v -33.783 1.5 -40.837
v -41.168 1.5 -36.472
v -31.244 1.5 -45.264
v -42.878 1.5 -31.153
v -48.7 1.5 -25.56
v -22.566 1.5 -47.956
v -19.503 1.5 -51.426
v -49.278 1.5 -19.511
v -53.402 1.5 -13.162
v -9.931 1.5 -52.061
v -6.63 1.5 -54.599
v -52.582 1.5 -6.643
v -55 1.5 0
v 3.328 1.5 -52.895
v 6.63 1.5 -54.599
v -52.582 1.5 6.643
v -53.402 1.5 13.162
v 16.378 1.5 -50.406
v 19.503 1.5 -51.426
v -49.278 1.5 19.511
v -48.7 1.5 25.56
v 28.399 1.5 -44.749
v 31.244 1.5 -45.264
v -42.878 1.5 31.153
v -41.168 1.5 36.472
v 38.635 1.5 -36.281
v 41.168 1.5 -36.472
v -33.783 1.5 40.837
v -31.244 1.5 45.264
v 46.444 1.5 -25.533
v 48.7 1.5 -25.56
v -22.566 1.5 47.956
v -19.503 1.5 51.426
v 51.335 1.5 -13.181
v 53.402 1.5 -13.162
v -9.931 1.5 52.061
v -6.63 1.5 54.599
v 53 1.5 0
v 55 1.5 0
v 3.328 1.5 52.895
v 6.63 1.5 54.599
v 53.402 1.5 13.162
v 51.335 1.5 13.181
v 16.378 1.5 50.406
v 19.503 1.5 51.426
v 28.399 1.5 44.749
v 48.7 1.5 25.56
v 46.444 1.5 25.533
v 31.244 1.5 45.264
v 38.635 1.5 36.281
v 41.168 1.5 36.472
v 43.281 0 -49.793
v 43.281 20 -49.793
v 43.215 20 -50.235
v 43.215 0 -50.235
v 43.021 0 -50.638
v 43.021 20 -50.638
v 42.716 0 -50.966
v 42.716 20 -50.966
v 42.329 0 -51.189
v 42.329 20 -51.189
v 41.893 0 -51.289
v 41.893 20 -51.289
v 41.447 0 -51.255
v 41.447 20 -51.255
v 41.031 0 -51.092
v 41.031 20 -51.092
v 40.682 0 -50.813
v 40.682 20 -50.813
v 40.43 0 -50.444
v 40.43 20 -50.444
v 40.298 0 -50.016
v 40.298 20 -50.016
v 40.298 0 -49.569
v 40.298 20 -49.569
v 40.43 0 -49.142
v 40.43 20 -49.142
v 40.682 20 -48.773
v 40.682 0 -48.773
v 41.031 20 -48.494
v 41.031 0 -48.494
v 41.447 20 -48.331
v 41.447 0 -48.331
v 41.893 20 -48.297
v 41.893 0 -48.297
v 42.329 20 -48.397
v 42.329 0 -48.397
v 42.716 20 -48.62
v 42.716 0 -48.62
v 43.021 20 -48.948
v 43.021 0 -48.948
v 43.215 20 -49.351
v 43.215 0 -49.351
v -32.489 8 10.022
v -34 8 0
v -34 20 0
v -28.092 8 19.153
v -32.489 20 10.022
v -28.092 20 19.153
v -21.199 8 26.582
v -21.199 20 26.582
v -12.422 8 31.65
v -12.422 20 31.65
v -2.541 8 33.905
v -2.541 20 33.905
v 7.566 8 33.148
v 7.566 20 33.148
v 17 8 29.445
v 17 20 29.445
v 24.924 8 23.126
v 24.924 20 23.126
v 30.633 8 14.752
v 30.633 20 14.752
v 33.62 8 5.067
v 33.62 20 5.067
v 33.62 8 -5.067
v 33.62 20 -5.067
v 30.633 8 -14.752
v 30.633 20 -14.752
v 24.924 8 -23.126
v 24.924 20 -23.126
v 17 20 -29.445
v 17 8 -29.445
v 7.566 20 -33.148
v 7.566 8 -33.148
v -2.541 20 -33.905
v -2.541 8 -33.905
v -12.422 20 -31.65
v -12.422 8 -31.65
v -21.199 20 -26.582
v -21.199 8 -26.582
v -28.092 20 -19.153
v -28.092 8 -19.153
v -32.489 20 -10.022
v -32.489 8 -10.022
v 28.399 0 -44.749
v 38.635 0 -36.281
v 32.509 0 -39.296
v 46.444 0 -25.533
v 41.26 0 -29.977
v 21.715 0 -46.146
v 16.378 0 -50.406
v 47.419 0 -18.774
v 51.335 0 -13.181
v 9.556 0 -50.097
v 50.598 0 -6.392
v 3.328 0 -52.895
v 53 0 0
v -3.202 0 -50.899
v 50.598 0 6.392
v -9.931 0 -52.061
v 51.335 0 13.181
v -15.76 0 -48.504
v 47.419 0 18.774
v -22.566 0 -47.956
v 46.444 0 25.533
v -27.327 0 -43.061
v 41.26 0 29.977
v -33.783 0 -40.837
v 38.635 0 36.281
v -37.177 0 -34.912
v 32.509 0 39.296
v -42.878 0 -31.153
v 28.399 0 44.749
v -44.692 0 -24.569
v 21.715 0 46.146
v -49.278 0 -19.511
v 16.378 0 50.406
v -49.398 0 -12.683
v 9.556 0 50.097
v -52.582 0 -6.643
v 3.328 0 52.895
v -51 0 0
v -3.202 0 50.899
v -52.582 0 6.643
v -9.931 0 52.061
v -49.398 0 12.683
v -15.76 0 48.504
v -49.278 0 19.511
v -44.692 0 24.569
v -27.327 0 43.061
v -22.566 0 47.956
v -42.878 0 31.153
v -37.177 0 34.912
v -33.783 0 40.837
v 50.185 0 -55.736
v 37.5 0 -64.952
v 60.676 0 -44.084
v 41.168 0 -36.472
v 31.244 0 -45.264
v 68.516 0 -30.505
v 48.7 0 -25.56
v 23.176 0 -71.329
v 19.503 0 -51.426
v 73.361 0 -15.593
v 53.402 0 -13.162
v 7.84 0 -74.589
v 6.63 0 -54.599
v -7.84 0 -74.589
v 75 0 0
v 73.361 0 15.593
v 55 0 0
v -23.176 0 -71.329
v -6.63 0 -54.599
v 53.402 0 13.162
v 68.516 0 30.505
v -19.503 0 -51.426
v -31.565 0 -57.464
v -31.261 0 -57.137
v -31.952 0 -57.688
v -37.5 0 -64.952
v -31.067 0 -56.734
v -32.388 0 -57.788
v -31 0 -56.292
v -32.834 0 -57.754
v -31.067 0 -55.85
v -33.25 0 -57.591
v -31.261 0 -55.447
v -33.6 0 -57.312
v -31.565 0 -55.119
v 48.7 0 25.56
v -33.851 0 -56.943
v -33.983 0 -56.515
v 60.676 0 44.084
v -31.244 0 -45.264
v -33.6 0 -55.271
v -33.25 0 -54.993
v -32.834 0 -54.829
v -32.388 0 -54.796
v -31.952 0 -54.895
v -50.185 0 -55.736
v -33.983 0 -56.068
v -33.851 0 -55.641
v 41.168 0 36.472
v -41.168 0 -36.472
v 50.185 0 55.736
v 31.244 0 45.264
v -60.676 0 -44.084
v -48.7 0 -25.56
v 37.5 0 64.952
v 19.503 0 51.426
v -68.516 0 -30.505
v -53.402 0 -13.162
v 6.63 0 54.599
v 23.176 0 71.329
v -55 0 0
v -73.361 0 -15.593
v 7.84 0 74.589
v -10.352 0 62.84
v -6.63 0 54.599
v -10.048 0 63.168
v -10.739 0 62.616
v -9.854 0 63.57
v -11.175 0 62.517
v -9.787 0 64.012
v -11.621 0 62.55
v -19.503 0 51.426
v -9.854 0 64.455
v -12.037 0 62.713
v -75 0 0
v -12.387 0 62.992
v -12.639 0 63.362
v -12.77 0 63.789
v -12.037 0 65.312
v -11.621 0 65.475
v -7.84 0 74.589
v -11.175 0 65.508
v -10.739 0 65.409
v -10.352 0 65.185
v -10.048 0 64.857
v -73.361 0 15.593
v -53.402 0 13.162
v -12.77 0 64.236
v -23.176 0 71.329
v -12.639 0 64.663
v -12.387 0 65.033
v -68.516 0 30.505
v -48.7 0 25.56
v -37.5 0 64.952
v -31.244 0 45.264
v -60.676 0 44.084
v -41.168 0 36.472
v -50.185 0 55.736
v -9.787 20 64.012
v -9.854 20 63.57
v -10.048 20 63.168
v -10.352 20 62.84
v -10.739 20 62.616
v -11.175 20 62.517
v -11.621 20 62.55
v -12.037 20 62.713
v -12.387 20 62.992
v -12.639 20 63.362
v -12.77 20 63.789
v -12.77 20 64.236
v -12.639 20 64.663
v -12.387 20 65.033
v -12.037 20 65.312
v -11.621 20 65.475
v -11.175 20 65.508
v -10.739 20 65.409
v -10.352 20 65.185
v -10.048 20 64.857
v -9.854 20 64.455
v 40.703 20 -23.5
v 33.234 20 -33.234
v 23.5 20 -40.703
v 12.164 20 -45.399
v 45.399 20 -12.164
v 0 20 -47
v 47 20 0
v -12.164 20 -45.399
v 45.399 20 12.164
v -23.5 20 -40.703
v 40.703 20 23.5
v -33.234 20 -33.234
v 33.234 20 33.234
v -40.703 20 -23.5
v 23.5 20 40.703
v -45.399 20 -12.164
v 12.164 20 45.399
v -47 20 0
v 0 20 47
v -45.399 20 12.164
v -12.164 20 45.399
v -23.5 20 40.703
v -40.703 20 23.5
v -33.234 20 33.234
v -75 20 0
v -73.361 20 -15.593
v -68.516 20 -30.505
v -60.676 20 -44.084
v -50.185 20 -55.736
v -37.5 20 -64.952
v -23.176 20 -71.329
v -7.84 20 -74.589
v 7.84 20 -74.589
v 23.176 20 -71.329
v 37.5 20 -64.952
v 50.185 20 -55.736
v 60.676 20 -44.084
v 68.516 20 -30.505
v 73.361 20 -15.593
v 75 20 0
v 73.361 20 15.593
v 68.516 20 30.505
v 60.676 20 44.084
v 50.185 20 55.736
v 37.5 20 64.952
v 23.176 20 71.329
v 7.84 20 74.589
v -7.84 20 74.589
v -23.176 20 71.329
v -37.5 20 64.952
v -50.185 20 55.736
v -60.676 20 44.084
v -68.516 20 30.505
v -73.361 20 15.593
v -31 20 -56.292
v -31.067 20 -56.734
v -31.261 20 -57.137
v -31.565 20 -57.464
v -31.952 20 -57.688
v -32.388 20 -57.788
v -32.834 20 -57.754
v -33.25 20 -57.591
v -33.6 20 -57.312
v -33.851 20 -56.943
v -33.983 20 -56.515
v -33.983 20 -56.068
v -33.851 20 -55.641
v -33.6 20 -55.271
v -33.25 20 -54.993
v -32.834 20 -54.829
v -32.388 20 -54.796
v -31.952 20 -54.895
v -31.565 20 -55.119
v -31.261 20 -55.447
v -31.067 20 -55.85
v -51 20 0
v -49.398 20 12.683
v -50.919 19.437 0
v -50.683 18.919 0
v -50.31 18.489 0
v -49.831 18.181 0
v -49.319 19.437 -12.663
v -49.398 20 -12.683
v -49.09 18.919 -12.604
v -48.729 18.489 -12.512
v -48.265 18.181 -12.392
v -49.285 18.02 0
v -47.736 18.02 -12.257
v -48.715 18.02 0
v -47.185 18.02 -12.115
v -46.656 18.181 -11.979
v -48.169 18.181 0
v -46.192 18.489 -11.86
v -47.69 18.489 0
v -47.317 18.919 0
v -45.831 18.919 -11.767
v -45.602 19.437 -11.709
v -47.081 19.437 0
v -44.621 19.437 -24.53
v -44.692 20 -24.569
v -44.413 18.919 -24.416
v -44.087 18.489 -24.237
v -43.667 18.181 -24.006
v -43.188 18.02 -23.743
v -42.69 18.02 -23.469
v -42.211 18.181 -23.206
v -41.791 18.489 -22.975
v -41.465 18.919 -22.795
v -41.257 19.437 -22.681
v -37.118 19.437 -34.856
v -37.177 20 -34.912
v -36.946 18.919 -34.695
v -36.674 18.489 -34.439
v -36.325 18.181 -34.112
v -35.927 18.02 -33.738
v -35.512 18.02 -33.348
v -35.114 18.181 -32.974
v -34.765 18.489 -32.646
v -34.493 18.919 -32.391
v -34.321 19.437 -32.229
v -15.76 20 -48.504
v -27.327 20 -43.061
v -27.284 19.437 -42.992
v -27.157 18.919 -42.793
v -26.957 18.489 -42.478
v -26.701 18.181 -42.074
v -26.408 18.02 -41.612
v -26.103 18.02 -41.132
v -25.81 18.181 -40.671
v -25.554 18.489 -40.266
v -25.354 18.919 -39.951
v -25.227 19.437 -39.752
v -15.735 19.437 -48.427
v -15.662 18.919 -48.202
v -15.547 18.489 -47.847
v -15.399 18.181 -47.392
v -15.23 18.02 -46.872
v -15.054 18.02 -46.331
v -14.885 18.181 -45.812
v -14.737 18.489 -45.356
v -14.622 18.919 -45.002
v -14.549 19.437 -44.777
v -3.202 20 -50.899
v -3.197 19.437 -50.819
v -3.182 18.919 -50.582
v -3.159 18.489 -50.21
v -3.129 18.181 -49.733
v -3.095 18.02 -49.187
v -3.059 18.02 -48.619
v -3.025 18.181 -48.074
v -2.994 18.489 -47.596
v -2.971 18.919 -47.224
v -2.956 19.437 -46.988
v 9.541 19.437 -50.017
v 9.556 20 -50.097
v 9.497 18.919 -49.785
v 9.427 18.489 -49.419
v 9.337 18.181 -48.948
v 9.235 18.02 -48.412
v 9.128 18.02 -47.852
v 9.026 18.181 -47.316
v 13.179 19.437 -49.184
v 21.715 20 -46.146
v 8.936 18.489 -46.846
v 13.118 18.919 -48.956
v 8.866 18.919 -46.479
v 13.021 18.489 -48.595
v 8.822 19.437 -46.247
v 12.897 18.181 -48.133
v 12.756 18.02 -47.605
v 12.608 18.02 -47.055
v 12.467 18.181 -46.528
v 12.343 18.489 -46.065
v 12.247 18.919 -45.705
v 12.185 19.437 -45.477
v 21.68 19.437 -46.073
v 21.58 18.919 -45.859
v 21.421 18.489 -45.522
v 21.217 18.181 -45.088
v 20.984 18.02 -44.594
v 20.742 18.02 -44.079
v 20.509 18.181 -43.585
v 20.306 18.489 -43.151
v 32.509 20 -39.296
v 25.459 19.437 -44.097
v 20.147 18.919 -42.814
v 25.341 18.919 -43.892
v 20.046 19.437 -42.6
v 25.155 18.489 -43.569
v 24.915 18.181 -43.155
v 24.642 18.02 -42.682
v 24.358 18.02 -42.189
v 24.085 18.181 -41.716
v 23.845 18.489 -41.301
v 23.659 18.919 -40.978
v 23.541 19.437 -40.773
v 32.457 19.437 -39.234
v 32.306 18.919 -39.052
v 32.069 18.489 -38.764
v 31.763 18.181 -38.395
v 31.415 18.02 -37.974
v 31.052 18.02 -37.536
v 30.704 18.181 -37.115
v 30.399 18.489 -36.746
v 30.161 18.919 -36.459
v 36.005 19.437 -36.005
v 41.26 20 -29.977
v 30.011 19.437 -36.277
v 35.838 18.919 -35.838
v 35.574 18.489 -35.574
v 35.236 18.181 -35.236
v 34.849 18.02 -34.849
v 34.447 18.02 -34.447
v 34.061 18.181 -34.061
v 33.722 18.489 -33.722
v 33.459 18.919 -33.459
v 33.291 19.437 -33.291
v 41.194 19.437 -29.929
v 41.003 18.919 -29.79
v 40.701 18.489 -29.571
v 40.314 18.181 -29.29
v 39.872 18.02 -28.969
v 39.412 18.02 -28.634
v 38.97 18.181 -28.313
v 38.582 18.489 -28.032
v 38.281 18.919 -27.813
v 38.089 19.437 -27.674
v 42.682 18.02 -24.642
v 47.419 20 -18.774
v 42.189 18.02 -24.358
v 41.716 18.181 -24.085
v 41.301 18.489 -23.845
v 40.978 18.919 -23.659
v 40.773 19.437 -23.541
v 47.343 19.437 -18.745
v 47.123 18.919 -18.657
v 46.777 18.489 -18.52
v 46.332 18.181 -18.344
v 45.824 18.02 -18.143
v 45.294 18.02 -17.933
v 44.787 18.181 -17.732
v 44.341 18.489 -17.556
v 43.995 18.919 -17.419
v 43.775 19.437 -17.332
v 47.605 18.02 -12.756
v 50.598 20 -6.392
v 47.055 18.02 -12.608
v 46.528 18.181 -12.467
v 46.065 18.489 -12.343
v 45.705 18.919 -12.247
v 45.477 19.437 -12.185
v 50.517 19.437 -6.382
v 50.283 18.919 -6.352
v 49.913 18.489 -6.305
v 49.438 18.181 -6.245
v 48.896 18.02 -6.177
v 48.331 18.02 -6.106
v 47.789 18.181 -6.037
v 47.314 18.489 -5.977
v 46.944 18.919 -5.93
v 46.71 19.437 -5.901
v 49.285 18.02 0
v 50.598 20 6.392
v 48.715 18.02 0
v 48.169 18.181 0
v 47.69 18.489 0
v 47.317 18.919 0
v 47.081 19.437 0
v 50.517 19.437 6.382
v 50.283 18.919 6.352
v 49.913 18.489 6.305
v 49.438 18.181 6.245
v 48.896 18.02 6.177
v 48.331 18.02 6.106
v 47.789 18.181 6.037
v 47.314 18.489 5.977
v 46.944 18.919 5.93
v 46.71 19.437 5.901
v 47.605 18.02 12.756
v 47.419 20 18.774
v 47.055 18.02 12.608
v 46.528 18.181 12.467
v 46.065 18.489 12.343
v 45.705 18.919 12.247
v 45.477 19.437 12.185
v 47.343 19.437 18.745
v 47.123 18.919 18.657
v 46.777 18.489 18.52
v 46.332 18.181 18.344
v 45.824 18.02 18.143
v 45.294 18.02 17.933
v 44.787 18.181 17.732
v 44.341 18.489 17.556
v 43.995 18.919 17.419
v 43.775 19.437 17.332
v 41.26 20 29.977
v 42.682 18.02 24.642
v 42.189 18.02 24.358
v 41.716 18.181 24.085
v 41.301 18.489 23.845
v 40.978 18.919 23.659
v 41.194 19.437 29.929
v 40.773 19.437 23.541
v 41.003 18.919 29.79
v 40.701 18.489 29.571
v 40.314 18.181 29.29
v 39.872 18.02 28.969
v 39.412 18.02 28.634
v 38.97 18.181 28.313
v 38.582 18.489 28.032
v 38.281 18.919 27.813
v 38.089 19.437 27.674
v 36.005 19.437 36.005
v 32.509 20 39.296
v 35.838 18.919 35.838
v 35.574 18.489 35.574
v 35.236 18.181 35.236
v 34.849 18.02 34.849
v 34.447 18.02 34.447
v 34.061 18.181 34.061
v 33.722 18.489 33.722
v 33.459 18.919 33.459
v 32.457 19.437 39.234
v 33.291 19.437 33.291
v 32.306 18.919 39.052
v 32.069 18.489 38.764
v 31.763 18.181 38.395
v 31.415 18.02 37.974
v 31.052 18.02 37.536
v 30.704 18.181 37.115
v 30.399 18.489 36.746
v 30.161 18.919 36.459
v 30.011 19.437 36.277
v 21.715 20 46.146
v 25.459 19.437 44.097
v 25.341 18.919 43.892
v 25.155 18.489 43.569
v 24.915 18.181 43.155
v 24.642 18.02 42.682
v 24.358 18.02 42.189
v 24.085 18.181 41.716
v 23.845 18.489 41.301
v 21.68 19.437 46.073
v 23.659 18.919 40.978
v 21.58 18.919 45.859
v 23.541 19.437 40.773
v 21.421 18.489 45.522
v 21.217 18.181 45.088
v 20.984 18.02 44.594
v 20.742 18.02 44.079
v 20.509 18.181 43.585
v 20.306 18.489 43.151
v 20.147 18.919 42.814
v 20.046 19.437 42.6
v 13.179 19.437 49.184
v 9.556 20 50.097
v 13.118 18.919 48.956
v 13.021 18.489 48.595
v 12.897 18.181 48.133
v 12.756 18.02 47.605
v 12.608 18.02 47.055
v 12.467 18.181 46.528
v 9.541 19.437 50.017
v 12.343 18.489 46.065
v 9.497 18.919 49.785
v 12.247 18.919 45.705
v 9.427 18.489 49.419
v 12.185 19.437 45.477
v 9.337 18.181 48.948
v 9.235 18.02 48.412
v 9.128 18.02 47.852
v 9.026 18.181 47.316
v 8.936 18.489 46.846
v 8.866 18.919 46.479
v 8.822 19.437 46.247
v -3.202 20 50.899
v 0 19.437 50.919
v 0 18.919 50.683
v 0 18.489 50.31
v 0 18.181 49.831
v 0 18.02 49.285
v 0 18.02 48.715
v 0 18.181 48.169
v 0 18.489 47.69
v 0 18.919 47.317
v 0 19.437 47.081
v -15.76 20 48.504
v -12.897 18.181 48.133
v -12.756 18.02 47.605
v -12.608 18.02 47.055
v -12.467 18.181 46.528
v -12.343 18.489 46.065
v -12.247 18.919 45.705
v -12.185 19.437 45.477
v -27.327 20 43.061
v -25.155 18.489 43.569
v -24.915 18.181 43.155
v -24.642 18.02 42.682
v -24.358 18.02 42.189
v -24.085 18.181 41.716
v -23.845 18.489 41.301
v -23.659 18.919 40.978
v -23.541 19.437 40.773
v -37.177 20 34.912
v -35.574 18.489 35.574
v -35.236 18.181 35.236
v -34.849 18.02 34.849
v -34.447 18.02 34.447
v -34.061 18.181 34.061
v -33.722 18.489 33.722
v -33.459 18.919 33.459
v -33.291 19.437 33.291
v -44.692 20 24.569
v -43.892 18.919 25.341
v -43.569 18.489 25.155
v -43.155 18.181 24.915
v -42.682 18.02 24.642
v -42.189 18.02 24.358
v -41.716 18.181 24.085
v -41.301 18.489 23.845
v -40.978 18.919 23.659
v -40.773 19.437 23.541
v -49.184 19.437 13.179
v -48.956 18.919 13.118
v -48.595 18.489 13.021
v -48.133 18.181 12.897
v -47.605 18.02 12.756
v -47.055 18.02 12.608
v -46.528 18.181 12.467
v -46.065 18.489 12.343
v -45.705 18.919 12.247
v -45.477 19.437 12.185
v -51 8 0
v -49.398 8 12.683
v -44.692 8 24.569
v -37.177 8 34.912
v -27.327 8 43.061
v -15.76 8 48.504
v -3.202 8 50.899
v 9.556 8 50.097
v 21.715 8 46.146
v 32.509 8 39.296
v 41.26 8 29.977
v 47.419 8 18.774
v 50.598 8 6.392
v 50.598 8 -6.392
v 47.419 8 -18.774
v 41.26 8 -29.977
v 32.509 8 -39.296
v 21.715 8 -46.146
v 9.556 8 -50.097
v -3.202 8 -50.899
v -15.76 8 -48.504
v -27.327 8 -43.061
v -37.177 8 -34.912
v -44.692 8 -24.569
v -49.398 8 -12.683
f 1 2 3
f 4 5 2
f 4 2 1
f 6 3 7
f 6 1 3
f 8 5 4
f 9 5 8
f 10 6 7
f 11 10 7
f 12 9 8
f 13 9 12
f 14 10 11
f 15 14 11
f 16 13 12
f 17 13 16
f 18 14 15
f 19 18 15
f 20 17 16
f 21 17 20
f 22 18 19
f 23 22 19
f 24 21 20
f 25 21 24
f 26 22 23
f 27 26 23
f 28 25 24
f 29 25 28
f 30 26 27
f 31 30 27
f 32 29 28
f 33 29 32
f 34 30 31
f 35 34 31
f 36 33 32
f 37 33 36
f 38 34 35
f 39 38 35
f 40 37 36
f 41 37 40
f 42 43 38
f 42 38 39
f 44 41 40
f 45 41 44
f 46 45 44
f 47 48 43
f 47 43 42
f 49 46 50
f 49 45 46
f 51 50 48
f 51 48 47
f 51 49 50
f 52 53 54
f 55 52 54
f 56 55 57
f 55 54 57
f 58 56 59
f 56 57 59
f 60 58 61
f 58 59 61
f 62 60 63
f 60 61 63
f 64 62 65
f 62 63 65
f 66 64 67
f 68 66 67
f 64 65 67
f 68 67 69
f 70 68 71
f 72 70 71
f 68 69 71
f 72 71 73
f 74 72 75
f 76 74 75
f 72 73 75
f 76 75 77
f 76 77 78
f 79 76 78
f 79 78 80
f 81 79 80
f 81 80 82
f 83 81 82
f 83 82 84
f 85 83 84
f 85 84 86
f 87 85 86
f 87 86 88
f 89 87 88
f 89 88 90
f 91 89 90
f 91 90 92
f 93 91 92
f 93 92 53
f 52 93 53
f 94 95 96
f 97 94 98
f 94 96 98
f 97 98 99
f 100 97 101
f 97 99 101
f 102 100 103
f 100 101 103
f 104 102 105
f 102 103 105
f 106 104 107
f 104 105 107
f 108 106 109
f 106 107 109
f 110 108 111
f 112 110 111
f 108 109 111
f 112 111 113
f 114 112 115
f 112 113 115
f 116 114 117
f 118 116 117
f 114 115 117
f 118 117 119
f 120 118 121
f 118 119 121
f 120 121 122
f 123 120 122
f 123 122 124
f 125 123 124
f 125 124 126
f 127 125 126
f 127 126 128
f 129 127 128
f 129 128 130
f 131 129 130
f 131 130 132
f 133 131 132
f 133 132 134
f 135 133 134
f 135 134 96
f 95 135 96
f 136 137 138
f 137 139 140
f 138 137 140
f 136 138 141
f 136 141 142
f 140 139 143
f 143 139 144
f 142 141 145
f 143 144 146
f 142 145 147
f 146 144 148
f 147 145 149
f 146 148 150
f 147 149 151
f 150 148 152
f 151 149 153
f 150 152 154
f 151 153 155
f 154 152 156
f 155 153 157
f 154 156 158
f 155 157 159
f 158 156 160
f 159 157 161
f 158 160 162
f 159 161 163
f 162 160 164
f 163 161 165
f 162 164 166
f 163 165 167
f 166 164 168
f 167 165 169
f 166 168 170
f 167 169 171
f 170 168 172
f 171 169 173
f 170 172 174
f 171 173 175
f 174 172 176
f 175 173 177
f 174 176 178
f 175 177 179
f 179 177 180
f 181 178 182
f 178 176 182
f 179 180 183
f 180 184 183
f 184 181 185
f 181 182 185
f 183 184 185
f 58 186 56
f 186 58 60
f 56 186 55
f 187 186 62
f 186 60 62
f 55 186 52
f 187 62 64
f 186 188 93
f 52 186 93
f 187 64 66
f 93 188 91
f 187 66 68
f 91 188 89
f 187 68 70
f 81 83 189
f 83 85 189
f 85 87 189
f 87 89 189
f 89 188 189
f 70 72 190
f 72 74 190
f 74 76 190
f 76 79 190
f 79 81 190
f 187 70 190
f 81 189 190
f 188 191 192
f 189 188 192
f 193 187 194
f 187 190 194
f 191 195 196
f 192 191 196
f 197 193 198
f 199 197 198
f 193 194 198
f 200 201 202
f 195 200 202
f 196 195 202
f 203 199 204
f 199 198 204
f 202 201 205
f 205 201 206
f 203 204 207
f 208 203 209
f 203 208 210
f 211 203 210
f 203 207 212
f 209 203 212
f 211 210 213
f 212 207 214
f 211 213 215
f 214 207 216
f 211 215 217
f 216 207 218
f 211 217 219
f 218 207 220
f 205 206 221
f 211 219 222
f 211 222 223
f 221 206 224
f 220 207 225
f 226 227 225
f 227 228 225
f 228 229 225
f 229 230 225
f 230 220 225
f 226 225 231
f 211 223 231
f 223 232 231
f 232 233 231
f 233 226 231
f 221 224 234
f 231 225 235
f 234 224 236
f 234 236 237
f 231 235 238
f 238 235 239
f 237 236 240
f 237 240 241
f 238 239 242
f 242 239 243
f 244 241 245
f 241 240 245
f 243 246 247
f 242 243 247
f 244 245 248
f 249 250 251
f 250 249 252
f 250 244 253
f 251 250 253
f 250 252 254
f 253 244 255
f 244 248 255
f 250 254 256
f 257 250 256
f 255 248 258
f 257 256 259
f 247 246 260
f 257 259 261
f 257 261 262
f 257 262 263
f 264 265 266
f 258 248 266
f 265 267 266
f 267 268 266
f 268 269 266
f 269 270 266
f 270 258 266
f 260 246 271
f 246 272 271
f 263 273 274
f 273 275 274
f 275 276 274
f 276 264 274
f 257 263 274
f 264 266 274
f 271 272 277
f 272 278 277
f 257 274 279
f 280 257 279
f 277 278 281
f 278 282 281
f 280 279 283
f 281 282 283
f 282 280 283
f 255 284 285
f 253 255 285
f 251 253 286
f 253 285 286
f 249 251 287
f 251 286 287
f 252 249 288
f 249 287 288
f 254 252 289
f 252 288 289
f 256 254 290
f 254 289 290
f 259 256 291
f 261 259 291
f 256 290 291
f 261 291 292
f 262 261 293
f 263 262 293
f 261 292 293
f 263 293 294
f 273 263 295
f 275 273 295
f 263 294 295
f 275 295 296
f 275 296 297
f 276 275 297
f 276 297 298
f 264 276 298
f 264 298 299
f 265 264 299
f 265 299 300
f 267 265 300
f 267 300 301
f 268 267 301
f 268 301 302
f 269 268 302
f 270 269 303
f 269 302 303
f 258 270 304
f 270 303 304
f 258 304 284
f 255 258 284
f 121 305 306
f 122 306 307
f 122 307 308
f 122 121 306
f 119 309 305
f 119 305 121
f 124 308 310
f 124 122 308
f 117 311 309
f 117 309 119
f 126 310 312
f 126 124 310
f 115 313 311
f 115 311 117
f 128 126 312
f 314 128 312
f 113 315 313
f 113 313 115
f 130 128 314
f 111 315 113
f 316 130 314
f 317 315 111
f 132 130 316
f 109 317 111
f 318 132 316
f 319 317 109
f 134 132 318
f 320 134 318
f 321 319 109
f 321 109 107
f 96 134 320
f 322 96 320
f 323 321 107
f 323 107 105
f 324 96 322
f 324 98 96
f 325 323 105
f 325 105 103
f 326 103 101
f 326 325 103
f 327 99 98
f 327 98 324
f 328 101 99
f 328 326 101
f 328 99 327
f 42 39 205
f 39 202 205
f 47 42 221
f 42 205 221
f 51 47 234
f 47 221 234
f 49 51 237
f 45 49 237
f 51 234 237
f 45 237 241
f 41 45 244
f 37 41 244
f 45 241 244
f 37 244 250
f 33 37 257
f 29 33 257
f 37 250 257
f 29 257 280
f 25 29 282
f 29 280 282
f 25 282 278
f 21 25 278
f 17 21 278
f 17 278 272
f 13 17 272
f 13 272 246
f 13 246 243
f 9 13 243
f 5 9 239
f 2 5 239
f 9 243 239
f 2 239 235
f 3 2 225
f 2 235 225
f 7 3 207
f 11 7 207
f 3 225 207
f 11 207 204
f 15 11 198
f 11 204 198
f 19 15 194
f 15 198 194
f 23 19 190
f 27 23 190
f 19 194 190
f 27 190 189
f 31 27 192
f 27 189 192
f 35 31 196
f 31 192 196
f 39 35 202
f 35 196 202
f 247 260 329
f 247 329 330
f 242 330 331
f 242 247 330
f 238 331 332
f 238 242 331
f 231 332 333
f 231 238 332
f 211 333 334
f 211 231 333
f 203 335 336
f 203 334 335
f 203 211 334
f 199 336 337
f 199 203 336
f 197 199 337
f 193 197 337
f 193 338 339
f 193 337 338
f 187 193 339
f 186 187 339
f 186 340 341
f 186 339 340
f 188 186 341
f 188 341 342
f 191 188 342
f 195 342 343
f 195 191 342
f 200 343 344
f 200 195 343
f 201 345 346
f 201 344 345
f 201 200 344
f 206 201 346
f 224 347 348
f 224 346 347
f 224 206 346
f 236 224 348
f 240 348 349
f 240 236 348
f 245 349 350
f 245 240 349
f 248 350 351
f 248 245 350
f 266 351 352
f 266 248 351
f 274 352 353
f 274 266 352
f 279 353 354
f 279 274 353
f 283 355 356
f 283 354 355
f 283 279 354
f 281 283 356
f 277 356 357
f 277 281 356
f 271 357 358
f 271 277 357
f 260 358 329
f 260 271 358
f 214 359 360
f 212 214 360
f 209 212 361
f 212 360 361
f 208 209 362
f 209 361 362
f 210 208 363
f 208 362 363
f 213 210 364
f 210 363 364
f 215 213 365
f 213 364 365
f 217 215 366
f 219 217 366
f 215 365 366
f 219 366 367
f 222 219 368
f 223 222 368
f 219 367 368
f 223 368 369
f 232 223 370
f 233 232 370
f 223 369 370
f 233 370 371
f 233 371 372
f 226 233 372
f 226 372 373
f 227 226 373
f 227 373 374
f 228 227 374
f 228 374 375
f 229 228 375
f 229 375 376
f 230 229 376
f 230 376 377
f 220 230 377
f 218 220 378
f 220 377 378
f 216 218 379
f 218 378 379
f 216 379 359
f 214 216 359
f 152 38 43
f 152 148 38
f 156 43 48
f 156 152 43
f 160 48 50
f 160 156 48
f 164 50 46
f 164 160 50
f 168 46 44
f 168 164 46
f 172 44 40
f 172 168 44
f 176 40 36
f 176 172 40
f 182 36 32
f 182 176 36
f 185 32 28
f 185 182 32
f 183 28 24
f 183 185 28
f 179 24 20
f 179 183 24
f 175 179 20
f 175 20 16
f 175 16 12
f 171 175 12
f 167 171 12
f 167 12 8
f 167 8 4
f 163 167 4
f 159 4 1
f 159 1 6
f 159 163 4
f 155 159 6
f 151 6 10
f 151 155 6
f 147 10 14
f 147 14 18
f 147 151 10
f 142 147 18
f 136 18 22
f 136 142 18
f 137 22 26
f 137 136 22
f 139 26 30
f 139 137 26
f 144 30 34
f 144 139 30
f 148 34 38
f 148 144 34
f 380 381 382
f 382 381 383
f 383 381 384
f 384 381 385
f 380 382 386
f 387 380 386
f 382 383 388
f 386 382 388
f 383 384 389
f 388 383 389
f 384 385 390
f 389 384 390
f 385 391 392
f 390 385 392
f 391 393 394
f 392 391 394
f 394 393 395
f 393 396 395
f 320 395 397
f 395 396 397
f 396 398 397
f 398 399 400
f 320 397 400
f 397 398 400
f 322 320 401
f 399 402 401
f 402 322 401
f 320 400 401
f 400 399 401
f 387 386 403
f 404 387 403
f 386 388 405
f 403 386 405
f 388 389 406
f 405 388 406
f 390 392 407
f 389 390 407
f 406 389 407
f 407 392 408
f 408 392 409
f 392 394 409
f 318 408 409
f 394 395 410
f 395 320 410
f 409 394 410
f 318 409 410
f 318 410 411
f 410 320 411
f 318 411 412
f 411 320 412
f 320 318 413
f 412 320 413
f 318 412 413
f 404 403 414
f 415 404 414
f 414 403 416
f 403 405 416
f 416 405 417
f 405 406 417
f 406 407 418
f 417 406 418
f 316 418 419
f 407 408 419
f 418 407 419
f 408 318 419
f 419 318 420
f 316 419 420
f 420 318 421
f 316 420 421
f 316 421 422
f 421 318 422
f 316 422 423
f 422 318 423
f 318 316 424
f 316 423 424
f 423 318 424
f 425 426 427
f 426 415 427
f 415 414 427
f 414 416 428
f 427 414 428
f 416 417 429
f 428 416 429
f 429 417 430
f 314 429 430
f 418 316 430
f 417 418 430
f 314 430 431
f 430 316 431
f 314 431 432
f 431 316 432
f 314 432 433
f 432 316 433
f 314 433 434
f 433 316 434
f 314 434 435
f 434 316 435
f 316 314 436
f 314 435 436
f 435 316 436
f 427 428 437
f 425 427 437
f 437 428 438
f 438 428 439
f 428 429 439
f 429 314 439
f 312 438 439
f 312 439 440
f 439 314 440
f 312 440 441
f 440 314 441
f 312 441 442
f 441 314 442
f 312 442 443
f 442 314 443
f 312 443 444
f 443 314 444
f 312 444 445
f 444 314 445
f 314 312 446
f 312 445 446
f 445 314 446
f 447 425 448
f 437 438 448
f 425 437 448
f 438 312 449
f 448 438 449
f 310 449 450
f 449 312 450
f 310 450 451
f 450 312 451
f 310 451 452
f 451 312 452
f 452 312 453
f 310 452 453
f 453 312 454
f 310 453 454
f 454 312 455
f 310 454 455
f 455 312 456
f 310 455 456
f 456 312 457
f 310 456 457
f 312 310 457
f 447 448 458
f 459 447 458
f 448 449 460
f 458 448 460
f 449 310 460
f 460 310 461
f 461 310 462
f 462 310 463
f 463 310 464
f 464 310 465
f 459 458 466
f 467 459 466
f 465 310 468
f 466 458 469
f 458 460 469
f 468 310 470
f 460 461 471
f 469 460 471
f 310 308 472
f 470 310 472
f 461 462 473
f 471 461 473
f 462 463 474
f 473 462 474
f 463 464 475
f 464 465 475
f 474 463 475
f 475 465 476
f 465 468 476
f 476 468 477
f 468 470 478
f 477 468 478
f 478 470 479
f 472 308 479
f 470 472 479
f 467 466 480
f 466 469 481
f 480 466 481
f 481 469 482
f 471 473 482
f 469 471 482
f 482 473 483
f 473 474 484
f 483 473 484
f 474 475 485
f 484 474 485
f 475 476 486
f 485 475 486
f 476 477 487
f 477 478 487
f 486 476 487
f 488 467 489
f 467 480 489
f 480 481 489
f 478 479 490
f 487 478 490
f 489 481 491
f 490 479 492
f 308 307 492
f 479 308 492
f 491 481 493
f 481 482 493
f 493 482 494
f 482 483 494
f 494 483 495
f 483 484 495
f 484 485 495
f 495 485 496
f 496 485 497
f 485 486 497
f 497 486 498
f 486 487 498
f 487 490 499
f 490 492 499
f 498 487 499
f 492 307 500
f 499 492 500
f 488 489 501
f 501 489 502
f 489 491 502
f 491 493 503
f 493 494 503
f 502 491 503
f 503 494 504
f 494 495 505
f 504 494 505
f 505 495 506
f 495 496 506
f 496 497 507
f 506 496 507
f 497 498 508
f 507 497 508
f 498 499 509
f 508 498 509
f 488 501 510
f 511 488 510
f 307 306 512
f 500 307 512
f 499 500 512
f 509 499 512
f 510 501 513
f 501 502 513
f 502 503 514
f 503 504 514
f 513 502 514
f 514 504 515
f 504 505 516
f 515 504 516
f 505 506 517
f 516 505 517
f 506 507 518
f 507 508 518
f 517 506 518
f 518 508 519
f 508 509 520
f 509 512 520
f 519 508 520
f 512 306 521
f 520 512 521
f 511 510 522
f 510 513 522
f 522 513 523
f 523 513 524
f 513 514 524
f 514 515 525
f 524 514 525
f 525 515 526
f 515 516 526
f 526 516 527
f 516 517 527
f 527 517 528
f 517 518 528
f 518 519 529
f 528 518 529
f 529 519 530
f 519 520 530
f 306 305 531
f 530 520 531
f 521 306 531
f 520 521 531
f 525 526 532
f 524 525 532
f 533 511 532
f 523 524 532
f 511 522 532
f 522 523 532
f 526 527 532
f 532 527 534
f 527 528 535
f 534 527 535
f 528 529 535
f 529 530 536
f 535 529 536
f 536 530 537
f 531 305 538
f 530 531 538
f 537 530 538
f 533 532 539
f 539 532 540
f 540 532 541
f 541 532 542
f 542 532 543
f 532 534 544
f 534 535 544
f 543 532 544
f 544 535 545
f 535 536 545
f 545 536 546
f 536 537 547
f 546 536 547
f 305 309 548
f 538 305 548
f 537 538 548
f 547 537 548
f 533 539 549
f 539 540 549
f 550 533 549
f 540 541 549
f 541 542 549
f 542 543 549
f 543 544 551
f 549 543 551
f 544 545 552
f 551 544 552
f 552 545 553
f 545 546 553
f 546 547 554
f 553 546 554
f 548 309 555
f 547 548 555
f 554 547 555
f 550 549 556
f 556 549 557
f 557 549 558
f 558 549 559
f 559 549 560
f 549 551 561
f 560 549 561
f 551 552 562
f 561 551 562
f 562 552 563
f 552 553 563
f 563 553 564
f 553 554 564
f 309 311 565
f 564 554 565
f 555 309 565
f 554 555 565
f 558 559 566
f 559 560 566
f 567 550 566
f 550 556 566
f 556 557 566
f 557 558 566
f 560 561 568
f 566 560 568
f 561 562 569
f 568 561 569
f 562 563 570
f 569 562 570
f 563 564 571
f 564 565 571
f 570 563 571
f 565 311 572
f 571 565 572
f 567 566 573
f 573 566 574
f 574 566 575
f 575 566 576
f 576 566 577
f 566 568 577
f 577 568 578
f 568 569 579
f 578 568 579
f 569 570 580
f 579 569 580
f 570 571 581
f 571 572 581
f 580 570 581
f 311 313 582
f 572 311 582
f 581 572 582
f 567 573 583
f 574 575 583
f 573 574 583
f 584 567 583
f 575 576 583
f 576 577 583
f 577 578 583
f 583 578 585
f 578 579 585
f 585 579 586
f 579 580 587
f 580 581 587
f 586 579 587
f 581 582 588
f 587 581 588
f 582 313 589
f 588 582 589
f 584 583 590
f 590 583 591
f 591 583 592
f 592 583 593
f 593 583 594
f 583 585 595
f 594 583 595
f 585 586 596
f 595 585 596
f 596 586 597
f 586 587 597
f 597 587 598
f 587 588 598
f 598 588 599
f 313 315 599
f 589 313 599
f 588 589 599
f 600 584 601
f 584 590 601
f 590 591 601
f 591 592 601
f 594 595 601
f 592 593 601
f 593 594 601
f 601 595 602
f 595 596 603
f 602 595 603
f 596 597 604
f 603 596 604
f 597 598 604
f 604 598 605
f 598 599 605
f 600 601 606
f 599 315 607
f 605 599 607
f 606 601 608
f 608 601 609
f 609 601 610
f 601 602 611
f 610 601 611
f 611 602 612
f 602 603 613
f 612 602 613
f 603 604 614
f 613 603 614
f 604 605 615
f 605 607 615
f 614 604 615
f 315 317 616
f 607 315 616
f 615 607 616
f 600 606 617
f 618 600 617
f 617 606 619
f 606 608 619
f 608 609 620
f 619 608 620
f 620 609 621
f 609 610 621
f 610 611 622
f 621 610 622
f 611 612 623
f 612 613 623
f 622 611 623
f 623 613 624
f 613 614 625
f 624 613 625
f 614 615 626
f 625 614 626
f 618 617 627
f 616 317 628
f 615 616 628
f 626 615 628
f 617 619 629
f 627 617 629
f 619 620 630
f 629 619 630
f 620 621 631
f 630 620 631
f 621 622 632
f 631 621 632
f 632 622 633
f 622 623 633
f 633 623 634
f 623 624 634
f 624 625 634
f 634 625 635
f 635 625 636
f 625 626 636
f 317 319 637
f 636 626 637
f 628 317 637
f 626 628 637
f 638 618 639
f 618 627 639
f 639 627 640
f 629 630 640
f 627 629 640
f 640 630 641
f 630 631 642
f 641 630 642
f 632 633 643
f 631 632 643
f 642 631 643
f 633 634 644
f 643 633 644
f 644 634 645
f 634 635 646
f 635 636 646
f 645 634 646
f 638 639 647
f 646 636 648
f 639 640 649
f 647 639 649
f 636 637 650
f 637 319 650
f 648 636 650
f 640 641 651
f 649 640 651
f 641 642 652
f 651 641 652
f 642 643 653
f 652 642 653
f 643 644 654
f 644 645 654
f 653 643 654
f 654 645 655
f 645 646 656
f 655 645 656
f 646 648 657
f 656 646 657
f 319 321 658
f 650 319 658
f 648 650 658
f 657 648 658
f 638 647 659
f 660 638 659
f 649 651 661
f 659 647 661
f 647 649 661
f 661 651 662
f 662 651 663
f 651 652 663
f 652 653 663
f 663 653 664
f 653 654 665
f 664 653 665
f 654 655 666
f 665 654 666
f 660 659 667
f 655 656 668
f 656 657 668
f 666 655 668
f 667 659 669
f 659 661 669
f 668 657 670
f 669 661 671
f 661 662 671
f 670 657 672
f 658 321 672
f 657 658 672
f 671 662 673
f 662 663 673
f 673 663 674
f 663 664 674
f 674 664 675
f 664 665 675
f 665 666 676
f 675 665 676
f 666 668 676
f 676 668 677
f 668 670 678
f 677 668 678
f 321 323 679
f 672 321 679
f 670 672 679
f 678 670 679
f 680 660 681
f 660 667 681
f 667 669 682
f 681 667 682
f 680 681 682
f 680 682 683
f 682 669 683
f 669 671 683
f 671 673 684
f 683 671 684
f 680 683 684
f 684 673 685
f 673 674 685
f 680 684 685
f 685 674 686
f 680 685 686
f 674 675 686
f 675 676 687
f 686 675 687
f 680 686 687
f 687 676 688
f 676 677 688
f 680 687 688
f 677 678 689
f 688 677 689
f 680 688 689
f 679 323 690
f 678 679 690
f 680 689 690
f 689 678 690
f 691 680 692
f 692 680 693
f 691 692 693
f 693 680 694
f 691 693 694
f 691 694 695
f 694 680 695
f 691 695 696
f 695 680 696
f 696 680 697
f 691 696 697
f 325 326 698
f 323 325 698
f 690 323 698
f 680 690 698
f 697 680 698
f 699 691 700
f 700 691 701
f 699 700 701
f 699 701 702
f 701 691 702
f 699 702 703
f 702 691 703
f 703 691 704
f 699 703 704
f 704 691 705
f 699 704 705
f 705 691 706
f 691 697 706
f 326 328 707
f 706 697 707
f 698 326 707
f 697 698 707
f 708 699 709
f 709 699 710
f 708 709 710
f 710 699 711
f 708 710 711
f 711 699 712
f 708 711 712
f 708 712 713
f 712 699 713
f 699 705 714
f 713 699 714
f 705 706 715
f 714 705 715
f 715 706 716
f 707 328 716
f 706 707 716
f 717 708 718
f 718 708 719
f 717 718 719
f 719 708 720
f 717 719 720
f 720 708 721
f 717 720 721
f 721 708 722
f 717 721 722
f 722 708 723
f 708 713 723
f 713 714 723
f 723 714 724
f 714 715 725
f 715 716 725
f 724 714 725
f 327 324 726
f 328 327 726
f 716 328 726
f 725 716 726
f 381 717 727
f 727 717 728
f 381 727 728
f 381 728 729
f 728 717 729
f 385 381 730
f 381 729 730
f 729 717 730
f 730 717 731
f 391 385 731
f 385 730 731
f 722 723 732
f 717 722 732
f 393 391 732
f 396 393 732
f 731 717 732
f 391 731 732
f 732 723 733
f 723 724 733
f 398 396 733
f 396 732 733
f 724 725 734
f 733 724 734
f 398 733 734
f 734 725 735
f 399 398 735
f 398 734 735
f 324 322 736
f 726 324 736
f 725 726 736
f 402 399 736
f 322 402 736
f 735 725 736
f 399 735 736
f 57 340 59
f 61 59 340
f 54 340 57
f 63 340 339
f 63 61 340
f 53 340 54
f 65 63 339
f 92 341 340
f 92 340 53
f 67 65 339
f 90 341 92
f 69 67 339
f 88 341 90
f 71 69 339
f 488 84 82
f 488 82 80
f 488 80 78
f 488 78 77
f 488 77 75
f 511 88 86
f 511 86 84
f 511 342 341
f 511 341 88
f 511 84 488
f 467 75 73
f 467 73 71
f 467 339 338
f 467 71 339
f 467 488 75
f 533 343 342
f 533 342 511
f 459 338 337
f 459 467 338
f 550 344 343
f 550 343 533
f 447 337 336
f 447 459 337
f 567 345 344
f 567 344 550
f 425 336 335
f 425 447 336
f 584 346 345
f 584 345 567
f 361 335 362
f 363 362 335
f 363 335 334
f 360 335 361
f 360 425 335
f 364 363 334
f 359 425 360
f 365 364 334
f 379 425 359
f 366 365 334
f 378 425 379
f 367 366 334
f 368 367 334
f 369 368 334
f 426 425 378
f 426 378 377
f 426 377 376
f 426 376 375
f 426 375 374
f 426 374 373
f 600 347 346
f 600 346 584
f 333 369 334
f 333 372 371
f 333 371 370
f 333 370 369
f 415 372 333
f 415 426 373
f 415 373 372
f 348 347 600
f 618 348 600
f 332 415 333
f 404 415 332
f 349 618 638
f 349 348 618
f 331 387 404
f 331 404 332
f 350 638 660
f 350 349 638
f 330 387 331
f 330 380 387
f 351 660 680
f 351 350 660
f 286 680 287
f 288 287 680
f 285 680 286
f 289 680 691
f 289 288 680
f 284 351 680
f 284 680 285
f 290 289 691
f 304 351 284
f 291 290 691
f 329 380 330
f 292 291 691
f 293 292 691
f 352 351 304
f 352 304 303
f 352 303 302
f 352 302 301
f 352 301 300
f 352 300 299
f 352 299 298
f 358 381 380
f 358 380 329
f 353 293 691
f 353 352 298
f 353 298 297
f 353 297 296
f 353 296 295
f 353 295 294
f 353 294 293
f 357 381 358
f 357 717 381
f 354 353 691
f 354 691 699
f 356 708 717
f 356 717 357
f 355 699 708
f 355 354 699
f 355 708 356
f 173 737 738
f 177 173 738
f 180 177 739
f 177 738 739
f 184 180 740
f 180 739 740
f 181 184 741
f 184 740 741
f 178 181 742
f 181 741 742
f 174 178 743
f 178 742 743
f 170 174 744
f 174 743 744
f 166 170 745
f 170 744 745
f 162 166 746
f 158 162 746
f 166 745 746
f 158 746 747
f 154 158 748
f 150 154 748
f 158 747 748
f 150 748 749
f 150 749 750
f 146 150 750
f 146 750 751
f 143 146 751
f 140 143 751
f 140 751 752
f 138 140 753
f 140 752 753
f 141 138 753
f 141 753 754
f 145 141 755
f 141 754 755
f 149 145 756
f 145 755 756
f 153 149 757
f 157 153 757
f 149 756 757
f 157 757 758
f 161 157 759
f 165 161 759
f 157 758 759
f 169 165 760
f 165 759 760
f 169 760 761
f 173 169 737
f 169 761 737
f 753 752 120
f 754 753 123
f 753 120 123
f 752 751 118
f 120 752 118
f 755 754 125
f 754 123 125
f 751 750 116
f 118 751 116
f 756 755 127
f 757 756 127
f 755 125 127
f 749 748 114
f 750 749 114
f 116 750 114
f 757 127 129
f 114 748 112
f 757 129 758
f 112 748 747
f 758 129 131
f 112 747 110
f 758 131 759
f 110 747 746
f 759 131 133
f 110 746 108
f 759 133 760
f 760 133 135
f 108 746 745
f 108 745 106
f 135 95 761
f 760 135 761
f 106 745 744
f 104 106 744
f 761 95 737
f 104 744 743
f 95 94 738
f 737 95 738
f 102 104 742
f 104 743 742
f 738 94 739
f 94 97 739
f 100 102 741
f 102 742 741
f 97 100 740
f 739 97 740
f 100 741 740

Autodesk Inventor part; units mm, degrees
ref_plane "YZ Plane" through (0, 0, 0) normal (1, 0, 0) x (0, 1, 0)
ref_plane "XZ Plane" through (0, 0, 0) normal (0, 1, 0) x (-1, 0, 0)
ref_plane "XY Plane" through (0, 0, 0) normal (0, 0, 1) x (1, 0, 0)
sketch "Эскиз1" plane through (0, 0, 0) normal (0, 0, 1) x (1, 0, 0)
  line L0 (0, 0) -> (0, 8)
  line L1 (0, 8) -> (0, 16)
  line L2 (0, 0) -> (0, 20)
  line L3 (0, 20) -> (-75, 20)
  line L4 (-75, 20) -> (-75, 0)
  line L5 (-75, 0) -> (-51, 0)
  line L6 (-51, 0) -> (-51, 8)
  line L7 (-51, 8) -> (-34, 8)
  line L8 (-34, 8) -> (-34, 20)
  line L9 (0, 20) -> (-49, 20)
  line L10 (-49, 20) -> (-49, 20)
  circle A0 centre (-49, 20) radius 2
  point P0 (-47, 20)
  point P1 (-51, 20)
  dimension "d22" = 20
  dimension "d23" = 75
  dimension "d26" = 24
  dimension "d27" = 8
  dimension "d28" = 17
  dimension "d29" = 49
  dimension "d30" = 0
  dimension "d31" = 4
revolve "Вращение1" add sketch "Эскиз1" angle 360 about axis through (0, 8, 0) along (0, 1, 0) contours L8 L7 L6 L5 L4 L3 A0
sketch "Эскиз2" plane through (0, 20, 0) normal (0, 1, 0) x (1, 0, 0)
  line L0 (0, 0) -> (41.7812, 49.7929)
  line L1 (0, 0) -> (65, 0) construction
  line L2 (0, 0) -> (-32.5, 56.2917)
  line L3 (0, 0) -> (65, 0) construction
  line L4 (0, 0) -> (-11.2871, -64.0125)
  line L5 (0, 0) -> (65, 0) construction
  circle A0 centre (-32.5, 56.2917) radius 1.5
  circle A1 centre (41.7812, 49.7929) radius 1.5
  circle A2 centre (-11.2871, -64.0125) radius 1.5
  dimension "d11" = 65
  dimension "d12" = 50
  dimension "d13" = 65
  dimension "d14" = 120
  dimension "d15" = 65
  dimension "d16" = 100
  dimension "d17" = 3
  dimension "d18" = 3
  dimension "d19" = 3
extrude "Выдавливание1" cut sketch "Эскиз2" against normal through all
sketch "Эскиз3" plane through (0, 0, 0) normal (0, -1, 0) x (1, 0, 0)
  circle A0 centre (0, 0) radius 53
  circle A1 centre (0, 0) radius 55
  dimension "d32" = 106
  dimension "d33" = 110
extrude "Выдавливание2" cut sketch "Эскиз3" against normal blind 1.5
properties part number "Корпус дросселя" material "Чугун, серый"
